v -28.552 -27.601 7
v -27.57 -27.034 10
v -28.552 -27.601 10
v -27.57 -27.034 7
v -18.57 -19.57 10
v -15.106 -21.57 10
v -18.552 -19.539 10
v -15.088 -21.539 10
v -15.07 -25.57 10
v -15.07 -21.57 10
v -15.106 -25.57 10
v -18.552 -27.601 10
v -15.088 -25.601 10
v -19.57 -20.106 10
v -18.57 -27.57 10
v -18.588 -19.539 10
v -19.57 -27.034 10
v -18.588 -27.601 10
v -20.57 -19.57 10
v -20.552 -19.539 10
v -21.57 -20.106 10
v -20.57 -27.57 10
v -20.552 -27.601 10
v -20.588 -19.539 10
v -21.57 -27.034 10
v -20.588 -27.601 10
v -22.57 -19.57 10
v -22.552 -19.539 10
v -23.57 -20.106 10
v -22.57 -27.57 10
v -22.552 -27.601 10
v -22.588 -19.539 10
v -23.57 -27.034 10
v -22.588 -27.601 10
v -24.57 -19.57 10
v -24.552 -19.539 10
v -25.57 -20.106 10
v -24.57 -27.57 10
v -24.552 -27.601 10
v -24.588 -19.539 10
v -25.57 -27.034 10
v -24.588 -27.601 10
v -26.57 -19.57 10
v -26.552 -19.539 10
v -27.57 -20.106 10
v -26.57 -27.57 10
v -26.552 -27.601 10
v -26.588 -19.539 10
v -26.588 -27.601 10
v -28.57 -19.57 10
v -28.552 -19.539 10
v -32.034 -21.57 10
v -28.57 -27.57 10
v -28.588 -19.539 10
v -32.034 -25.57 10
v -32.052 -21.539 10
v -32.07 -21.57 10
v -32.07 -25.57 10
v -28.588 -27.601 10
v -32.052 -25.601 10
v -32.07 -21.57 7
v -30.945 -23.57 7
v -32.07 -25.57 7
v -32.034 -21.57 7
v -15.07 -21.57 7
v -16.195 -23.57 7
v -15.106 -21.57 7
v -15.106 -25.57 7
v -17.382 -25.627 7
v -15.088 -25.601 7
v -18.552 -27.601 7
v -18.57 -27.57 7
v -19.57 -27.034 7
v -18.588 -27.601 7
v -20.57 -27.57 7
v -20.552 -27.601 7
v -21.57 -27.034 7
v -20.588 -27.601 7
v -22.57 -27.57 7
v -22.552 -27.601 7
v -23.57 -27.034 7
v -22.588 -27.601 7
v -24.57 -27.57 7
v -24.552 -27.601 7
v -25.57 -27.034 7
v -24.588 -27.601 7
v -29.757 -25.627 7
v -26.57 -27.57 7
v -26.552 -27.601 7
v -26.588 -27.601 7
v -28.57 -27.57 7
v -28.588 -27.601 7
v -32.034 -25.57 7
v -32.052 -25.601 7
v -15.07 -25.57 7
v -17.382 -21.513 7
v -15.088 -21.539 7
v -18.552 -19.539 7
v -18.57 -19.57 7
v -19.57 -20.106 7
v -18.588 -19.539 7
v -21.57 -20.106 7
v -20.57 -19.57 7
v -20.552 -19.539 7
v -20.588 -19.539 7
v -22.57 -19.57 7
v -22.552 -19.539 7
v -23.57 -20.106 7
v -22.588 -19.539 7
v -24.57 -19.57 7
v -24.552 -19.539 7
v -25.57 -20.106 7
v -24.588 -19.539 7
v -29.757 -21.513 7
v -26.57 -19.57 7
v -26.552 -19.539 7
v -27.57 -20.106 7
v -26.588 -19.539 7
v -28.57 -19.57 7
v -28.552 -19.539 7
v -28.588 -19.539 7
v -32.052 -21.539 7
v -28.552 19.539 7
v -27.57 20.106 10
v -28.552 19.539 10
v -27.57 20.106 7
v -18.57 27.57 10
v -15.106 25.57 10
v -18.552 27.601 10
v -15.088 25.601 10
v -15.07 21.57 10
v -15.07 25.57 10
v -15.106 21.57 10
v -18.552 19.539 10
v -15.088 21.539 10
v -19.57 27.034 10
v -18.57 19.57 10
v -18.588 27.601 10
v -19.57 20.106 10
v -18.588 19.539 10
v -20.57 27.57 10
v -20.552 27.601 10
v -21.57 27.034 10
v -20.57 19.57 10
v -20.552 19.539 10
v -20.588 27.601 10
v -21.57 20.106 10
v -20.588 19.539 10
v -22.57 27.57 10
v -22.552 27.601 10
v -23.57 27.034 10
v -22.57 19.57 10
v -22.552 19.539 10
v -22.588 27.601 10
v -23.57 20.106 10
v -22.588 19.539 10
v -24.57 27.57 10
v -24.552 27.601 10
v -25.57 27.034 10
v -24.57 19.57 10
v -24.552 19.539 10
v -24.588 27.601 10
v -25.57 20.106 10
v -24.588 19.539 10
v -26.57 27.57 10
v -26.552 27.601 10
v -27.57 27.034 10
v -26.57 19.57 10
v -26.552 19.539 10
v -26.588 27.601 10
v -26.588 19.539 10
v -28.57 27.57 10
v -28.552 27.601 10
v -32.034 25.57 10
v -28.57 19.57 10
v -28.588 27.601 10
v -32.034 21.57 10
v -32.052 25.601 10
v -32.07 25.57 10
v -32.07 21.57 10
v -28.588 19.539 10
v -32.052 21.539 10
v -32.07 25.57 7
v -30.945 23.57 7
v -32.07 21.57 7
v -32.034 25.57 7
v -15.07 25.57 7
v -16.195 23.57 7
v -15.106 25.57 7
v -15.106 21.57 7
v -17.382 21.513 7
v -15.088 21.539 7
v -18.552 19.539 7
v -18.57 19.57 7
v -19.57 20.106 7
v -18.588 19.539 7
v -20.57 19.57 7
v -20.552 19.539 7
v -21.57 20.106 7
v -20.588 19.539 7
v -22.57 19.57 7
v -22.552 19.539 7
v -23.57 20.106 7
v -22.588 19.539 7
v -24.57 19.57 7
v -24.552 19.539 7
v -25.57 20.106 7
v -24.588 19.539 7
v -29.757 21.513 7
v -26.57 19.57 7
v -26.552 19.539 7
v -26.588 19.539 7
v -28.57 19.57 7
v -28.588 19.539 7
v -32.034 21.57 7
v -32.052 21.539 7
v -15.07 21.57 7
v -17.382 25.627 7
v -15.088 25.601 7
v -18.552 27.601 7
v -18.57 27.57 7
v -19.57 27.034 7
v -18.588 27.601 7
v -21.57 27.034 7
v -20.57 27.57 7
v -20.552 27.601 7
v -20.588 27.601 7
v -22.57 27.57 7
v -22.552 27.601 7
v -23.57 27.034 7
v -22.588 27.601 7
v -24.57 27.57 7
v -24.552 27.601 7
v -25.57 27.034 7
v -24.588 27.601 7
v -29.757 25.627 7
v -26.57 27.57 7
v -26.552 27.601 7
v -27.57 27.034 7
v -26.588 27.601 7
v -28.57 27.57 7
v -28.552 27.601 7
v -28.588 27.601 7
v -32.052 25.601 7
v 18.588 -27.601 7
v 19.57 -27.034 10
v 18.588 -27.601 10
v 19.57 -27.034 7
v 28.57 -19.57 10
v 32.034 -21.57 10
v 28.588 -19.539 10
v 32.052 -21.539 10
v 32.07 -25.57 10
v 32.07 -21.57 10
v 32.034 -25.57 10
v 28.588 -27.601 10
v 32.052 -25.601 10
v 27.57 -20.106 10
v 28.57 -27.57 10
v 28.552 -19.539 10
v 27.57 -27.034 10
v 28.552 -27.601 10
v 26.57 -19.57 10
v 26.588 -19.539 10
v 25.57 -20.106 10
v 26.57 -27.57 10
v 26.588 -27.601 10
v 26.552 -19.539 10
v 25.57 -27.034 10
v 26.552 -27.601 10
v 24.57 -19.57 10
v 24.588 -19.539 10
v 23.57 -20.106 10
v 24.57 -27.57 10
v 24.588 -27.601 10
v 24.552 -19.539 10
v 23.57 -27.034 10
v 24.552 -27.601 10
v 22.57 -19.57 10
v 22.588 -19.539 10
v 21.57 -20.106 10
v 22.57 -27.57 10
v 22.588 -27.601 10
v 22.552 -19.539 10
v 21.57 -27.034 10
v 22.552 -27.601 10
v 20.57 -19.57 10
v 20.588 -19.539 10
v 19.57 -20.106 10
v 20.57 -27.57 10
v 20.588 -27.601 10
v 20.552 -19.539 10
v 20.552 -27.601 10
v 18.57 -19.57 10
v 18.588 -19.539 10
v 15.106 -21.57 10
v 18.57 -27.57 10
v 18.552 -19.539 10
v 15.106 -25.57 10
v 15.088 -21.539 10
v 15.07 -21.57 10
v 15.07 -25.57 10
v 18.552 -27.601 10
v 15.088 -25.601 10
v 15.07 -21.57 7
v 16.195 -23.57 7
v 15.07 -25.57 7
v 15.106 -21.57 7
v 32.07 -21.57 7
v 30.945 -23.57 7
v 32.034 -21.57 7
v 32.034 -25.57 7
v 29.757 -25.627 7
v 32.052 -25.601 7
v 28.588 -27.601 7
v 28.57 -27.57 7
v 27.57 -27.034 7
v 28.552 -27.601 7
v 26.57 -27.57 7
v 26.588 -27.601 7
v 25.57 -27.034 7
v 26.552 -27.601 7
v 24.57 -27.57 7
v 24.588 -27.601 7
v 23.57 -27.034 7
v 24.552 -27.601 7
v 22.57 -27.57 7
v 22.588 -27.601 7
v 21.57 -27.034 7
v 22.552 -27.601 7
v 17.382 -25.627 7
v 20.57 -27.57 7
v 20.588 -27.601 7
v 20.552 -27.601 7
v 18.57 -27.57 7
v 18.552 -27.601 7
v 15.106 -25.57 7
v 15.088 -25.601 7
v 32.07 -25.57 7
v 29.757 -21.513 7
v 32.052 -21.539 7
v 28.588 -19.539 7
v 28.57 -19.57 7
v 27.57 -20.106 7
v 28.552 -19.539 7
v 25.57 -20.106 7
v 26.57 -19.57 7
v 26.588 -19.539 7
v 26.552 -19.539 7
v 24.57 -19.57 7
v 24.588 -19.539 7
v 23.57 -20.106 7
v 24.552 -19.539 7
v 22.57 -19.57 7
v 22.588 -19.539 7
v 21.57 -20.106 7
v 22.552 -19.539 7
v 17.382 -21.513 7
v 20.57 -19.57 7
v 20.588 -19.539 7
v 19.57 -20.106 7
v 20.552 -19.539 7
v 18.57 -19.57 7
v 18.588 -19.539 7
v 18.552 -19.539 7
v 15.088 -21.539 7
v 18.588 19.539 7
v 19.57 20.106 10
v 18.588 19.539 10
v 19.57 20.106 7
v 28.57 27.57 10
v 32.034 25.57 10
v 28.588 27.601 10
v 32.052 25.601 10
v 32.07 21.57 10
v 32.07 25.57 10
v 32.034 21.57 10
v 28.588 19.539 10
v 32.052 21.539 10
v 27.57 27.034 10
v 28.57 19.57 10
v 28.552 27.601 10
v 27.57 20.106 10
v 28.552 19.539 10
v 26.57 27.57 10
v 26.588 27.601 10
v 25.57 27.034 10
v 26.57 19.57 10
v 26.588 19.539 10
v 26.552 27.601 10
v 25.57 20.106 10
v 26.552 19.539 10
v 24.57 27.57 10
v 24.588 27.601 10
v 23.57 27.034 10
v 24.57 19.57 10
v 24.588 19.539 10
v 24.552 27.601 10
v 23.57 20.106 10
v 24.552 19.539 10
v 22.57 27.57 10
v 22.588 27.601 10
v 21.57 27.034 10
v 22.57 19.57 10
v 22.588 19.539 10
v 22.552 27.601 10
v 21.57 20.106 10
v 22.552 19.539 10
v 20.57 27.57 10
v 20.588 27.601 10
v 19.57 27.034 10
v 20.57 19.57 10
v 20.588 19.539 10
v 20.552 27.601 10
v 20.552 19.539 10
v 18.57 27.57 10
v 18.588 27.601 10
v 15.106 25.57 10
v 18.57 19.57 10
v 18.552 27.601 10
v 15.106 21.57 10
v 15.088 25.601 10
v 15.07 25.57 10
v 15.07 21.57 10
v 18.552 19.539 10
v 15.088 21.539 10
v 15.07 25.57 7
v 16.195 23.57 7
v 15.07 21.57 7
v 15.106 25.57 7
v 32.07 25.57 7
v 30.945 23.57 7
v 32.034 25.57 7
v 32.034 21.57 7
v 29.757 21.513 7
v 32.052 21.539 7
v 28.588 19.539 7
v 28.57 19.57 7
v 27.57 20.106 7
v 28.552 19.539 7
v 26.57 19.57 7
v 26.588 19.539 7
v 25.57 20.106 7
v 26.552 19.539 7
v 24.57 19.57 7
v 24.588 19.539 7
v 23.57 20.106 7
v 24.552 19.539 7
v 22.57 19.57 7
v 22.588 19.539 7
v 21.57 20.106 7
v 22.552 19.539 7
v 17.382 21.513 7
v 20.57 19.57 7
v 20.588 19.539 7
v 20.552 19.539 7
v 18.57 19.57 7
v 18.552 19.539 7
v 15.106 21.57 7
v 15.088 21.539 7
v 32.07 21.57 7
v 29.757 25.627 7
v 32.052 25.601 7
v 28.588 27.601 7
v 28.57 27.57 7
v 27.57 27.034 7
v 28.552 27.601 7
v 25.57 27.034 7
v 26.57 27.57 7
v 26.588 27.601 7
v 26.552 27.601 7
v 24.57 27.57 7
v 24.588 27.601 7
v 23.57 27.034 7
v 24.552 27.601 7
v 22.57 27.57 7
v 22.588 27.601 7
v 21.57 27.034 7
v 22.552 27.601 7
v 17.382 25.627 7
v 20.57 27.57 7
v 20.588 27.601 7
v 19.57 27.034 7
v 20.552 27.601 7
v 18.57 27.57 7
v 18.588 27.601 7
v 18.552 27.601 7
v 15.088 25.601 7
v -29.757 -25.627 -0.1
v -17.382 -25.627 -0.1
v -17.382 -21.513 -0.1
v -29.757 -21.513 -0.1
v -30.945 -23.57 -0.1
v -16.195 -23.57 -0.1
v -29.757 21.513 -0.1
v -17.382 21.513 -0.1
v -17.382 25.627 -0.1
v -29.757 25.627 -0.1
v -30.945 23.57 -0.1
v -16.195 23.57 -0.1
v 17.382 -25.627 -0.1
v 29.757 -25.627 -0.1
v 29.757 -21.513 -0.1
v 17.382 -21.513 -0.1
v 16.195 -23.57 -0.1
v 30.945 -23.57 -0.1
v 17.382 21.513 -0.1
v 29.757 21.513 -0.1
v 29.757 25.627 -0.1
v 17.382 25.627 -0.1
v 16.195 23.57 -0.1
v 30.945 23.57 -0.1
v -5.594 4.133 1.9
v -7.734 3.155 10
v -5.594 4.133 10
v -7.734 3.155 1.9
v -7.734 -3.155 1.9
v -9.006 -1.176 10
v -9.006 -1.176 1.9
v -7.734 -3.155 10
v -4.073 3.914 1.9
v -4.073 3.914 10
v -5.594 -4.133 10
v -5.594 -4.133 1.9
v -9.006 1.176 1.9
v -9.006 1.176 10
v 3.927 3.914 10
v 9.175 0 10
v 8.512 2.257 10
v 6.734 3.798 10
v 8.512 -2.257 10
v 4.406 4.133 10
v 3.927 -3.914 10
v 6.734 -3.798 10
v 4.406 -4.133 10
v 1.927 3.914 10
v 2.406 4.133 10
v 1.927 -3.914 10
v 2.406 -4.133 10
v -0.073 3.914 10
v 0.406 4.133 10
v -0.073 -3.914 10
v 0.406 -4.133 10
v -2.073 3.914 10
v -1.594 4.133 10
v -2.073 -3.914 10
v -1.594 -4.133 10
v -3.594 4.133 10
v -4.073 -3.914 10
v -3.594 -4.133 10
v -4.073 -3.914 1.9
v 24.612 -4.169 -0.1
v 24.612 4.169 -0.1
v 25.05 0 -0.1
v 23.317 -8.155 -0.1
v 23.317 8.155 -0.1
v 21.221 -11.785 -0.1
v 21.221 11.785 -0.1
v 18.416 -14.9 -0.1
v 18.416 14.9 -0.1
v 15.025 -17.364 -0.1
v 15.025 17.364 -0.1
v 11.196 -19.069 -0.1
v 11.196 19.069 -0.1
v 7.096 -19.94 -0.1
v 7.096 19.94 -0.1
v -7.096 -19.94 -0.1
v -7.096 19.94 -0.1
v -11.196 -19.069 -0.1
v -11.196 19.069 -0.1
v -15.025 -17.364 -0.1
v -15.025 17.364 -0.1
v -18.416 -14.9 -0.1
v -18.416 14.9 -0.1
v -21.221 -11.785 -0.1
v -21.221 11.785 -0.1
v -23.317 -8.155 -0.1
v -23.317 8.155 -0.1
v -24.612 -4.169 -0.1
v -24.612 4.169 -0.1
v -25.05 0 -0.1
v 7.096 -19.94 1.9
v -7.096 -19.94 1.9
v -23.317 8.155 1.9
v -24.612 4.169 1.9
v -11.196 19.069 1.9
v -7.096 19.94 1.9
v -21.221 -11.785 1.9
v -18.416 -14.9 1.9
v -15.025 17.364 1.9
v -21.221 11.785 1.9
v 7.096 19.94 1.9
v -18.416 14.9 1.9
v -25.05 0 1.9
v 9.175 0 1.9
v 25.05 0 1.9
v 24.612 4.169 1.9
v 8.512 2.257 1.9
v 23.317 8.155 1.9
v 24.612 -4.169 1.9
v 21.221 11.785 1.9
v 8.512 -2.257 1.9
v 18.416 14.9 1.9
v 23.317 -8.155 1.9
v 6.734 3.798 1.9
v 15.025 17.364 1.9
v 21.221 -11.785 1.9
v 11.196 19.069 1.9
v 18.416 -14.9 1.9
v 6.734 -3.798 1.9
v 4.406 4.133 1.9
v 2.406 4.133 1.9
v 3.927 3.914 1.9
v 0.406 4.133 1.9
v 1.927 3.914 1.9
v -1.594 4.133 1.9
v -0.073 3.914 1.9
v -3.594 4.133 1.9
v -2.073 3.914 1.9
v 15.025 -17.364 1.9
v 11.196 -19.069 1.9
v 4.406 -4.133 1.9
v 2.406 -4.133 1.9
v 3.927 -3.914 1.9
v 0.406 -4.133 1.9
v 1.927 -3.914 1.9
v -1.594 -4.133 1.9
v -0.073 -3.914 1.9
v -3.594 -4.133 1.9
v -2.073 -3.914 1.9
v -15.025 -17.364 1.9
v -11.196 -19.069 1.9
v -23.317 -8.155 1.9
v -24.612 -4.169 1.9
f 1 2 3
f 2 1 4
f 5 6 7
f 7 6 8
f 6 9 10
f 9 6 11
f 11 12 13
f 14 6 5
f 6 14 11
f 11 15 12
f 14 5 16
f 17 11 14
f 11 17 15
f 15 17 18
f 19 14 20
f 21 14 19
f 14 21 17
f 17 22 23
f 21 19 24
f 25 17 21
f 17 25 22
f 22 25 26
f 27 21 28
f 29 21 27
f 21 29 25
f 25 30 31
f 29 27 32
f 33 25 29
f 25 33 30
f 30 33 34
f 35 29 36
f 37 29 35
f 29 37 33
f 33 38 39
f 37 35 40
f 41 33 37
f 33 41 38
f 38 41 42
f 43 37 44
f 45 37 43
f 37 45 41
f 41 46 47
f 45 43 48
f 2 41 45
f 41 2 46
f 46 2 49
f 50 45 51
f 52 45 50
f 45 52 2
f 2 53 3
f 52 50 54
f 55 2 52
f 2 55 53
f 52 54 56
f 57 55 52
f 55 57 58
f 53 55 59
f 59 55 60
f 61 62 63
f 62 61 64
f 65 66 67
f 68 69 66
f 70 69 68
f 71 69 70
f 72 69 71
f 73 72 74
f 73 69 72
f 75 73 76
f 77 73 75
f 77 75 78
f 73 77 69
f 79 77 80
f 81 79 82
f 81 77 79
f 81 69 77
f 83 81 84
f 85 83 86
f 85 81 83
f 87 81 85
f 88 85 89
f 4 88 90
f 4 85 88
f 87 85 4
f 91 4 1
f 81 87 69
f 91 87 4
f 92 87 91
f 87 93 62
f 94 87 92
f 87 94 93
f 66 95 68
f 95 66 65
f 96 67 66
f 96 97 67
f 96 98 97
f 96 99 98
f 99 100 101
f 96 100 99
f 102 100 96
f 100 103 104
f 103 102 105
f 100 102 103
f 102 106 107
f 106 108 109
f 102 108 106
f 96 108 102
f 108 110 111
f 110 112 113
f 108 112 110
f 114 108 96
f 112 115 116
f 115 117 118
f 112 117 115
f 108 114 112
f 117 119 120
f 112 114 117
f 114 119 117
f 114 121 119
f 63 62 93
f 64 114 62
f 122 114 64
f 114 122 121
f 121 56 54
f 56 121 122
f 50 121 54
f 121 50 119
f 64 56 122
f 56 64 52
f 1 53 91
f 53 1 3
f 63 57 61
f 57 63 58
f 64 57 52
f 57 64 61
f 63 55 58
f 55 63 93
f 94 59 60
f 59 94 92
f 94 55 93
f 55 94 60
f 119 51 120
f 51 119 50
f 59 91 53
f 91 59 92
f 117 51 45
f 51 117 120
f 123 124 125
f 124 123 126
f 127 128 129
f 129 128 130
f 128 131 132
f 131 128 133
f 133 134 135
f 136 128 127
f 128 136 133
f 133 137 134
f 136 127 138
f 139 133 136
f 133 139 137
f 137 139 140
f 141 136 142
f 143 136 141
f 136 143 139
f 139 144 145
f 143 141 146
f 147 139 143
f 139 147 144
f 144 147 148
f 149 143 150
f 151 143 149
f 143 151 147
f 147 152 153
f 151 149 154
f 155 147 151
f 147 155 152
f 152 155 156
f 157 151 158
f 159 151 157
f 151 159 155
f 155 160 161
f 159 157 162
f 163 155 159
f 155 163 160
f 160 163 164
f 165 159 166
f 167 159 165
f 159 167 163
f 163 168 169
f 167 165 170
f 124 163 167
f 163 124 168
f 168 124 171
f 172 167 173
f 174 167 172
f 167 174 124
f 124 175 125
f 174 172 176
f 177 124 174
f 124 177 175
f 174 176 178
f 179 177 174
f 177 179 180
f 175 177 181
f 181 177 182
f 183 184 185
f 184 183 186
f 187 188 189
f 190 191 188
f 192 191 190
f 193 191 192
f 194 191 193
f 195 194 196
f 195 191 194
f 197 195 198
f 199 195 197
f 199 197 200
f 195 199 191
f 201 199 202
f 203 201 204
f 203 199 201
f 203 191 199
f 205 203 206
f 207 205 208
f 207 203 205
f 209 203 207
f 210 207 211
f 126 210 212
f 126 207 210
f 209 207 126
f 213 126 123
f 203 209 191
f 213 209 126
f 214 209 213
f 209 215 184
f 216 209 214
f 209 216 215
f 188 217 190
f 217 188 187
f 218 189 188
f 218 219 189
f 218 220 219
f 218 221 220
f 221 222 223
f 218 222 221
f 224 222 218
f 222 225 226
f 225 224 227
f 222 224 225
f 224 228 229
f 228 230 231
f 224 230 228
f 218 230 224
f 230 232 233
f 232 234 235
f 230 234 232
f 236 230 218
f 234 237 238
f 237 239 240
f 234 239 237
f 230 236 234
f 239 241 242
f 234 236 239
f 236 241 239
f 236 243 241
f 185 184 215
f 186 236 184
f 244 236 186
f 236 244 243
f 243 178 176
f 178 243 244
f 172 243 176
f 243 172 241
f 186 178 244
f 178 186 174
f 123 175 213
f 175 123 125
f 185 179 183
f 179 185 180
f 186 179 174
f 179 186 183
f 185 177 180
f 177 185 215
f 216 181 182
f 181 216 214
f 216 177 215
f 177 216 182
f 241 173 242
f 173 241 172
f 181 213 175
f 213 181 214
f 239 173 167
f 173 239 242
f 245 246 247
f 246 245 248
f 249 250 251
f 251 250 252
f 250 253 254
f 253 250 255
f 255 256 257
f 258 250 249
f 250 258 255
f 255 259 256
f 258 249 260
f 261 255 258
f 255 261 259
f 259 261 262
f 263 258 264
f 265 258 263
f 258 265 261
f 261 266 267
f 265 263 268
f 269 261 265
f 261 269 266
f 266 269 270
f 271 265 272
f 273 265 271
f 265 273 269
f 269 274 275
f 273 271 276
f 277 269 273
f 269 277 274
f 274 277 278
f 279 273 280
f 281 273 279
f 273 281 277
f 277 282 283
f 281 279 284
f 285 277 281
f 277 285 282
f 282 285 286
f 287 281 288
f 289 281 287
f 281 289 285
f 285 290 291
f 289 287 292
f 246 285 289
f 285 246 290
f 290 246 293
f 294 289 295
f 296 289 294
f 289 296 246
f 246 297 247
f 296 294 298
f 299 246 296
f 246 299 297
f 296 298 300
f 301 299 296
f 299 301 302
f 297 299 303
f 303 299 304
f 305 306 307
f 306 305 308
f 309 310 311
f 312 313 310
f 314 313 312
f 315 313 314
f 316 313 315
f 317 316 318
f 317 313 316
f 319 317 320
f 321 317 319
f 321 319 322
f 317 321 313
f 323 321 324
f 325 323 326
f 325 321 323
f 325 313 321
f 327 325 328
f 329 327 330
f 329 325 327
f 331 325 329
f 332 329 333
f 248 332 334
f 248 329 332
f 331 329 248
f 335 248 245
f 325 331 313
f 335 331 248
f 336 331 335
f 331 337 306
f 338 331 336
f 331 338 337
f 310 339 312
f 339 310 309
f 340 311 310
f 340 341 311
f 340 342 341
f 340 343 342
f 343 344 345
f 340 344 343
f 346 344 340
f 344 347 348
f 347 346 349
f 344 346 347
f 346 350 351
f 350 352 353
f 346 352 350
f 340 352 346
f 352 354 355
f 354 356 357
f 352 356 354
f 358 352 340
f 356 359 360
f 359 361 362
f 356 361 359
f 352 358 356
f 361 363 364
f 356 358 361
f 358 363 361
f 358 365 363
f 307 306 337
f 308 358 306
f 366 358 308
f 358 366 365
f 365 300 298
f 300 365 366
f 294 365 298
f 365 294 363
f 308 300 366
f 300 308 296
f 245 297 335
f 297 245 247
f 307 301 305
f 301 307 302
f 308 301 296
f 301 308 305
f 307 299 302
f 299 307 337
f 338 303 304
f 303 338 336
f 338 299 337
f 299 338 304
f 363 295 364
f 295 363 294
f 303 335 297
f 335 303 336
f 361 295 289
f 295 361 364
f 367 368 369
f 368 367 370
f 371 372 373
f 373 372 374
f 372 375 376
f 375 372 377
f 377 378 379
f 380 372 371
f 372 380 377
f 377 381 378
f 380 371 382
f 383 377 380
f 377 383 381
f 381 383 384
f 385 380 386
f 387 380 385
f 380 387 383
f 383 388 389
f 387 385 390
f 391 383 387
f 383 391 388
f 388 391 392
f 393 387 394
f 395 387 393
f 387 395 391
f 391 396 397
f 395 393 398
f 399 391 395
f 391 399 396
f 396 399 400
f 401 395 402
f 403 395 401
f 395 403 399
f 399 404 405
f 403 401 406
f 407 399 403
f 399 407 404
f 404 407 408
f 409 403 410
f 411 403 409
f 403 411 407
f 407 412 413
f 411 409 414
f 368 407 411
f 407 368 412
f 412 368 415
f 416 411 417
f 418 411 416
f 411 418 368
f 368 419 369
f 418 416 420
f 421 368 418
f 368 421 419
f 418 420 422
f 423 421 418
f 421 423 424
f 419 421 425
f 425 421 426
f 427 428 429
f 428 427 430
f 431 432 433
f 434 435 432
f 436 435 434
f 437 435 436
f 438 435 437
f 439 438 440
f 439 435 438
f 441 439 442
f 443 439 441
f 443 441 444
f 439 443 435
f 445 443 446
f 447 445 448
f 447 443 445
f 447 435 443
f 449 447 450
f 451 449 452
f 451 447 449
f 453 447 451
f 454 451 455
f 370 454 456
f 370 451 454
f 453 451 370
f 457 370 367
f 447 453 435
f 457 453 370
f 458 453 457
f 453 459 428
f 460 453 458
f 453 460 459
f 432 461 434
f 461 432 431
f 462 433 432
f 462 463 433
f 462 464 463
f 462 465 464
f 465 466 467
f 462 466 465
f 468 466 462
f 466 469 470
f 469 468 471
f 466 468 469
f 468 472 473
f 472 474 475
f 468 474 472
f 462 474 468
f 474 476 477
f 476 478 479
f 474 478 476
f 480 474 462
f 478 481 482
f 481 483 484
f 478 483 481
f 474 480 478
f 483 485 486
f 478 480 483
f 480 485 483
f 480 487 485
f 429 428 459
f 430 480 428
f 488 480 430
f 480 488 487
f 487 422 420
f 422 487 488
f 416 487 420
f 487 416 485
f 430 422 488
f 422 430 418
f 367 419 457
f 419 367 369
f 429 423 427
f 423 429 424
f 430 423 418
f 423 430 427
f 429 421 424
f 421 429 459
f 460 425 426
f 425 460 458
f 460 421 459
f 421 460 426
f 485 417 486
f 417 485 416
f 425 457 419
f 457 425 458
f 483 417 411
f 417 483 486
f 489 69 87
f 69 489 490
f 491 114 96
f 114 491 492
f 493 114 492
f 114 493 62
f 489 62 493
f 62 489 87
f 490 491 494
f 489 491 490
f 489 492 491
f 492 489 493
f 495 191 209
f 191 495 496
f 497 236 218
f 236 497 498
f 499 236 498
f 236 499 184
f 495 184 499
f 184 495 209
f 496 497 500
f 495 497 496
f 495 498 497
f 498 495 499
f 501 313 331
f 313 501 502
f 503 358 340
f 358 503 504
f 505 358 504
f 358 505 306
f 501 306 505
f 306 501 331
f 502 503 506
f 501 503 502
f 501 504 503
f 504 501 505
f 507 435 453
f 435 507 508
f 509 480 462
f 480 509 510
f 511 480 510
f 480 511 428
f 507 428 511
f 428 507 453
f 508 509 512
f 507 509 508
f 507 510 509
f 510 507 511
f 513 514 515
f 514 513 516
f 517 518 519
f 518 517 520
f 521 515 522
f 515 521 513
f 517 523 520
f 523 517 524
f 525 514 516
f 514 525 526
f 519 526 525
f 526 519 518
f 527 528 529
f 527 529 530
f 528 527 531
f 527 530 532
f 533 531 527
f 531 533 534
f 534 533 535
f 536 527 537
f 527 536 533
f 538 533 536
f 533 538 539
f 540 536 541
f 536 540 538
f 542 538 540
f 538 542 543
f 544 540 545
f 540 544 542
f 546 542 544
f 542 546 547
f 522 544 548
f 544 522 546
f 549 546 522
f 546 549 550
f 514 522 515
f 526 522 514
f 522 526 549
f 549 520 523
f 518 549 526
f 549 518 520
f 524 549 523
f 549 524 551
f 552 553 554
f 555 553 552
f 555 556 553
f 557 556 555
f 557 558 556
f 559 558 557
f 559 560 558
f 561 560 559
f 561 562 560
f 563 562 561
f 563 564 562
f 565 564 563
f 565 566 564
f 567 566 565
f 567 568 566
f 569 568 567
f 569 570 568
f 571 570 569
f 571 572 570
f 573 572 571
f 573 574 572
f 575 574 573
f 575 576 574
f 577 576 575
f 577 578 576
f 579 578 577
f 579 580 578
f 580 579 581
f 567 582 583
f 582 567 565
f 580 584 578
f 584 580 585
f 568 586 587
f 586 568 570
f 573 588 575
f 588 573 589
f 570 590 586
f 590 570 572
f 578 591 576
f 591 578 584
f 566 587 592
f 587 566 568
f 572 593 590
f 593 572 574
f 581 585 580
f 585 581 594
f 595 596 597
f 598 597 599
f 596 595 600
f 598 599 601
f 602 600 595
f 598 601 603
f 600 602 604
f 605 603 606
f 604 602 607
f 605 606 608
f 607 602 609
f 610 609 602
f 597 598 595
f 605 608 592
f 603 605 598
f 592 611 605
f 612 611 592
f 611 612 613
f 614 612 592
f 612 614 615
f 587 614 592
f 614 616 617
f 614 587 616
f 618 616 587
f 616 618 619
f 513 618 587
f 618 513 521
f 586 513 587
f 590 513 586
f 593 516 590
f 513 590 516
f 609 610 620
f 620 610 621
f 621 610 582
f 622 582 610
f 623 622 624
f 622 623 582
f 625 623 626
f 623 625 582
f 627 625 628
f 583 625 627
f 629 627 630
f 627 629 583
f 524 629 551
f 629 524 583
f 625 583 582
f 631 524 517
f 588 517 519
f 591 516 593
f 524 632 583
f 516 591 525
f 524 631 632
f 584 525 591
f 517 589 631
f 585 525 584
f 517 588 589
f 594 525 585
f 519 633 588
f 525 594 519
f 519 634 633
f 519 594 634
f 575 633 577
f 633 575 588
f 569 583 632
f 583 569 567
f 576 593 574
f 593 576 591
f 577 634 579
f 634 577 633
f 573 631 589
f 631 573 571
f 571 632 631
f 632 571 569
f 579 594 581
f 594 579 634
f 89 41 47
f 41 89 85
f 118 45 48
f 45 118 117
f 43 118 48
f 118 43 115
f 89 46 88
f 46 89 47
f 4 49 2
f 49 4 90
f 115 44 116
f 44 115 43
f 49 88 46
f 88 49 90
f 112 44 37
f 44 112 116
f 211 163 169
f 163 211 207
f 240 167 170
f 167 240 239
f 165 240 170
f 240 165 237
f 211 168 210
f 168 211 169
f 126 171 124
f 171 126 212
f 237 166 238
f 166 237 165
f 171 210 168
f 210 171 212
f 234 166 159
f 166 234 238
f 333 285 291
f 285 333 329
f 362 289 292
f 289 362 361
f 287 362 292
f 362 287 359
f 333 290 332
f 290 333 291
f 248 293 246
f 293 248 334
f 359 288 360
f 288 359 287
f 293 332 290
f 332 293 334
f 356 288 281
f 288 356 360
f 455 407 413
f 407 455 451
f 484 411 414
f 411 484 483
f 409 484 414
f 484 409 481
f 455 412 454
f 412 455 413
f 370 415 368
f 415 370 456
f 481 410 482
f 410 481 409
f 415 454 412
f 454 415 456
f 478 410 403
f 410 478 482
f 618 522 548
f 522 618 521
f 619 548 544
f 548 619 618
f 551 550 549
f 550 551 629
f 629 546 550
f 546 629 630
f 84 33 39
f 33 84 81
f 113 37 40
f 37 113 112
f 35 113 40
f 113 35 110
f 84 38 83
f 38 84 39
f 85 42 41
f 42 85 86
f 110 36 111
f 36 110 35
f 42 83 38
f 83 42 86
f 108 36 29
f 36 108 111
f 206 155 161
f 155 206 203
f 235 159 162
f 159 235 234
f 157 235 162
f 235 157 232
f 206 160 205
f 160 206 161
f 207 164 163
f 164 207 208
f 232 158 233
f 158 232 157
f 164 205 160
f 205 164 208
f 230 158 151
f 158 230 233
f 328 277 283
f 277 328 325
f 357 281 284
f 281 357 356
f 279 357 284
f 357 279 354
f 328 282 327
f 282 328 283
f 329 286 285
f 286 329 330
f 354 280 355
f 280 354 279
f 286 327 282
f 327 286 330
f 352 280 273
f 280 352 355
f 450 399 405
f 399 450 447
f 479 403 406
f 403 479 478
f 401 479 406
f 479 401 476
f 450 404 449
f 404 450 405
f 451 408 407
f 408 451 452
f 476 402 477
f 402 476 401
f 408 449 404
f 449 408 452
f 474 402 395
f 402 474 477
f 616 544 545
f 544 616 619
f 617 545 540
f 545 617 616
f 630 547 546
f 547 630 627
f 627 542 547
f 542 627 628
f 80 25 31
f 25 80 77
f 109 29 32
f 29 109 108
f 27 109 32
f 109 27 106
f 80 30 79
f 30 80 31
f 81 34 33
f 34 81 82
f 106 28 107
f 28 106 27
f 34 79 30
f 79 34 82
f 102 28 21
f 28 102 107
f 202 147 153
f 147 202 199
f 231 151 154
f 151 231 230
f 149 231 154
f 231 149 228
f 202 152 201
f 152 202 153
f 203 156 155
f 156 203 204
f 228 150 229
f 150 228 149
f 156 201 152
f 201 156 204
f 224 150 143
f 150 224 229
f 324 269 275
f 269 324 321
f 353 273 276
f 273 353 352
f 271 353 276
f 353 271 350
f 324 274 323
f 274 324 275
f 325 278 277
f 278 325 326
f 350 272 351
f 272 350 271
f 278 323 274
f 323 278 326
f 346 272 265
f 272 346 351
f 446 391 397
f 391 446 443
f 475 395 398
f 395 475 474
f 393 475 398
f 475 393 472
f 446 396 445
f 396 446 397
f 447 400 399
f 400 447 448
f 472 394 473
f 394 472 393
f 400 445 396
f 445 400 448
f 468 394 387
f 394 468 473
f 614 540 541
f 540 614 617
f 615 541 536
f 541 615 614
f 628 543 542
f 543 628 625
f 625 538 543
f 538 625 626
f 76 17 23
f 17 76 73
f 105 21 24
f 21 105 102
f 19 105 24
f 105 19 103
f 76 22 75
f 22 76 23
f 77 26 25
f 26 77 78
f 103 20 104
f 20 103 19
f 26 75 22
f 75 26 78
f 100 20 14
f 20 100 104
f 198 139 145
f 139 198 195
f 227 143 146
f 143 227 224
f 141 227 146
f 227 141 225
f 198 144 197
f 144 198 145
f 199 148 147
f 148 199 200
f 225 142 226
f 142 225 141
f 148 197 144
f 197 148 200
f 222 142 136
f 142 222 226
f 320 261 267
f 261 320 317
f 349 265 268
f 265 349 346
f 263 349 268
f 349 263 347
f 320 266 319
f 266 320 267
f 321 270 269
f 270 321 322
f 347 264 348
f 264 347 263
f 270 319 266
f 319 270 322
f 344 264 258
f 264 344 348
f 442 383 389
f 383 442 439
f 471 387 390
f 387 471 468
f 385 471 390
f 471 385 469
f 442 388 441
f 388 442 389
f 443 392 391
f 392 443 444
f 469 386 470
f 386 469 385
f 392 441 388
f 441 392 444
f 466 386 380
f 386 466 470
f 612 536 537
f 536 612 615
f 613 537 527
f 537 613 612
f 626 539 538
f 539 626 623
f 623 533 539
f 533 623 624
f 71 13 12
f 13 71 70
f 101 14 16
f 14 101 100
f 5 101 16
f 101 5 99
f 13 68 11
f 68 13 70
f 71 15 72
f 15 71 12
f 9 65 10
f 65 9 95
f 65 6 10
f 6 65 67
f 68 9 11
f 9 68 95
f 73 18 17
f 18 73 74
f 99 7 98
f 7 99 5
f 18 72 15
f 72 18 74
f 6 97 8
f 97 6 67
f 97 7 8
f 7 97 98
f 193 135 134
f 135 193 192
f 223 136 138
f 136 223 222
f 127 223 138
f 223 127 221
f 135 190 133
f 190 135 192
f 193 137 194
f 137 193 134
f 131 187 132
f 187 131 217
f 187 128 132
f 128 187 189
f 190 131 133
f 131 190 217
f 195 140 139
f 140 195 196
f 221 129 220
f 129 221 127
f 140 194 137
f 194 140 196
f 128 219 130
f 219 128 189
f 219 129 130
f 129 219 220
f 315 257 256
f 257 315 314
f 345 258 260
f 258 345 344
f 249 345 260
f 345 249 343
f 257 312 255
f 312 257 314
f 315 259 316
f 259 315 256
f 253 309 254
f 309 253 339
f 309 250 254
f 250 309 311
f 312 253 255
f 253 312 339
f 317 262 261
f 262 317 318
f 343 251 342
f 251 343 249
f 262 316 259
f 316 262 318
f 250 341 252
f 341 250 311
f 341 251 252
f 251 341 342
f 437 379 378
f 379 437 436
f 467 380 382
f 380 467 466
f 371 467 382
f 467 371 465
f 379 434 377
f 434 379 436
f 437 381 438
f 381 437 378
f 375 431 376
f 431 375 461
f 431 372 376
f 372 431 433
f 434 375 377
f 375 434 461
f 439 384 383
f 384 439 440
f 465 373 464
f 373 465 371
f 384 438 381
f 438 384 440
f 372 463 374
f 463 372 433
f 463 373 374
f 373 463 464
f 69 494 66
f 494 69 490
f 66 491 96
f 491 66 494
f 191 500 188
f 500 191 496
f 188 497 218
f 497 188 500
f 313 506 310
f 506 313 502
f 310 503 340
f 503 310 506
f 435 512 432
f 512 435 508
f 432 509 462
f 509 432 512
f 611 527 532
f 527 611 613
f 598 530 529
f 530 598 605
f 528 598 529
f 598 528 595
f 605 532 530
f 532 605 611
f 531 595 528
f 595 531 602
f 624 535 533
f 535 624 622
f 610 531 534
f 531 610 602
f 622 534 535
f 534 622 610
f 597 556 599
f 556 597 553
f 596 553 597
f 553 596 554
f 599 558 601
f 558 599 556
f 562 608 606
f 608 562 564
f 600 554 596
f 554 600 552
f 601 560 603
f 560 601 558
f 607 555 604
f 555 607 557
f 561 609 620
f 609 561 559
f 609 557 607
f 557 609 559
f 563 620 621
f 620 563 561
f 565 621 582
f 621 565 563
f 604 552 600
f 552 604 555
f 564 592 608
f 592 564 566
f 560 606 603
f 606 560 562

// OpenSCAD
// [FL_INDEX: keywords="openscad, 3d_parametric, NEMA_Mounting_Holes, csg_solid" | COT="Parametric OpenSCAD design from 3DCodeverse"]
// Title: NEMA Mounting Holes

/**
 * NEMAMount.scad
 *
 * Produces the shape to be subtracted from a base to make a NEMA motor mount.
 *
 * @copyright  James Newton, 2013
 * @license    http://creativecommons.org/licenses/LGPL/2.1/
 * @license    http://creativecommons.org/licenses/by-sa/3.0/
 *
 * @see        http://www.thingiverse.com/thing:137829
 *
 *
**/


/* ******************************************************************************
 * Customizer parameters and rendering
 * ****************************************************************************** */

/* [Global] */


//The NEMA size. See: massmind.org/techref/io/stepper/nemasizes.htm
NEMA_Size = 23; // [8,11,14,17,23,34,42]

//Drive Shaft clearance hole: 0=no shaft, positive # = that size, negative number = standard NEMA shaft + abs(shaft) e.g. NEMA_Mount(17,shaft=-1) gives a 5+1=6mm shaft hole.
shaft = -1; // [-50:50]

//Pilot mounting indentation diameter: 0=no indentation, positive # = that diameter, negative # = standard NEMA pilot + abs(pilot)
pilot = -1; // [-20:90]

//height of the mounting and shaft holes. e.g. the thickness of your mounting plate
height = 10; // [1:100]

//Size of nut head. 0 for no nuts or an M size.
nut_size = 4; // [0:20]

//height of the nut head. 0 for no nuts or an M height.
nut_height =3; // [0:20]

//Distance the motor can slide in the mount.
adjust = 5; // [0:10]

//Show sample base with NEMA mount subtracted.
Show_Base =  0; // [0,1]

/* [Hidden] */


difference() {
	if (Show_Base==1)
		translate([-NEMA_Size*2,-NEMA_Size*2,0]) cube([NEMA_Size*4,NEMA_Size*4,height-.01]);
	NEMA_Mount (NEMA_Size, shaft, pilot, height, nut_size, nut_height, adjust);
	}


module NEMA_Mount (NEMA_Size, shaft=-1, pilot=-1, height, nut_size, nut_height, adjust=0) {
	for (r = [-adjust: 2: adjust]) 
		translate([r,0,0])
		Simple_NEMA_Mount (NEMA_Size, shaft, pilot, height, nut_size, nut_height, $fs=adjust/2+0.01);
	//drop the resolution to keep from swamping the system with CSG Products.
	}

module Simple_NEMA_Mount (NEMA_Size, shaft=-1, pilot=-1, height, nut_size, nut_height) {

	NEMA_Mount = lookup(NEMA_Size,[
		[ 8,15.4/2],
		[11,23.0/2],
		[14,26.0/2],
		[17,31.04/2],
		[23,47.14/2],
		[34,69.58/2],
		[42,88.90/2]
		]);

	NEMA_Bolt = lookup(NEMA_Size,[
		[ 8,2.0/2],
		[11,2.5/2],
		[14,3.0/2],
		[17,4.0/2],
		[23,4.75/2],
		[34,6.5/2],
		[42,7.15/2]
		]);

//the -.1's here are to ensure the hole breaks through the mounting plate
	translate([-NEMA_Mount,-NEMA_Mount,-.1]) cylinder(h=height-nut_height+.2, r=NEMA_Bolt);
	if (nut_height > 0) translate([-NEMA_Mount,-NEMA_Mount,height-nut_height]) nut(nut_size, nut_height);
	translate([-NEMA_Mount,+NEMA_Mount,-.1]) cylinder(h=height-nut_height+.2, r=NEMA_Bolt);
	if (nut_height > 0) translate([-NEMA_Mount,+NEMA_Mount,height-nut_height]) nut(nut_size, nut_height);
	translate([+NEMA_Mount,-NEMA_Mount,-.1]) cylinder(h=height-nut_height+.2, r=NEMA_Bolt);
	if (nut_height > 0) translate([+NEMA_Mount,-NEMA_Mount,height-nut_height]) nut(nut_size, nut_height);
	translate([+NEMA_Mount,+NEMA_Mount,-.1]) cylinder(h=height-nut_height+.2, r=NEMA_Bolt);
	if (nut_height > 0) translate([+NEMA_Mount,+NEMA_Mount,height-nut_height]) nut(nut_size, nut_height);
	if (shaft > 0) translate([0,0,-.1]) cylinder(h=height+.1, r=shaft);
	if (shaft < 0) translate([0,0,-.1]) cylinder(h=height+.1, r=-shaft + lookup(NEMA_Size,[
		[ 8,4.00/2],
		[11,5.00/2],
		[14,5.00/2],
		[17,5.00/2],
		[23,6.35/2],
		[34,9.50/2],
		[42,16.0/2]
		])
		);
	if (pilot > 0) cylinder(h=2, r=pilot);
	if (pilot < 0) translate([0,0,-.1]) cylinder(h=2, r=-pilot + lookup(NEMA_Size,[
		[ 8,15.00/2],
		[11,22.00/2],
		[14,22.00/2],
		[17,22.00/2],
		[23,38.10/2],
		[34,73.00/2],
		[42,73.0/2]
		])
		);
	};

module nut(nutSize,nutHeight) {
	//I have no idea if this actually produces the correct size.
	// need to check against:
	//http://www.boltdepot.com/fastener-information/Nuts-Washers/Metric-Nut-Dimensions.aspx
	for (r = [-60, 0, 60]) 
		translate([0,0,nutHeight/2]) rotate([0,0,r]) cube([nutSize*1.75, nutSize, nutHeight], true);
	}
